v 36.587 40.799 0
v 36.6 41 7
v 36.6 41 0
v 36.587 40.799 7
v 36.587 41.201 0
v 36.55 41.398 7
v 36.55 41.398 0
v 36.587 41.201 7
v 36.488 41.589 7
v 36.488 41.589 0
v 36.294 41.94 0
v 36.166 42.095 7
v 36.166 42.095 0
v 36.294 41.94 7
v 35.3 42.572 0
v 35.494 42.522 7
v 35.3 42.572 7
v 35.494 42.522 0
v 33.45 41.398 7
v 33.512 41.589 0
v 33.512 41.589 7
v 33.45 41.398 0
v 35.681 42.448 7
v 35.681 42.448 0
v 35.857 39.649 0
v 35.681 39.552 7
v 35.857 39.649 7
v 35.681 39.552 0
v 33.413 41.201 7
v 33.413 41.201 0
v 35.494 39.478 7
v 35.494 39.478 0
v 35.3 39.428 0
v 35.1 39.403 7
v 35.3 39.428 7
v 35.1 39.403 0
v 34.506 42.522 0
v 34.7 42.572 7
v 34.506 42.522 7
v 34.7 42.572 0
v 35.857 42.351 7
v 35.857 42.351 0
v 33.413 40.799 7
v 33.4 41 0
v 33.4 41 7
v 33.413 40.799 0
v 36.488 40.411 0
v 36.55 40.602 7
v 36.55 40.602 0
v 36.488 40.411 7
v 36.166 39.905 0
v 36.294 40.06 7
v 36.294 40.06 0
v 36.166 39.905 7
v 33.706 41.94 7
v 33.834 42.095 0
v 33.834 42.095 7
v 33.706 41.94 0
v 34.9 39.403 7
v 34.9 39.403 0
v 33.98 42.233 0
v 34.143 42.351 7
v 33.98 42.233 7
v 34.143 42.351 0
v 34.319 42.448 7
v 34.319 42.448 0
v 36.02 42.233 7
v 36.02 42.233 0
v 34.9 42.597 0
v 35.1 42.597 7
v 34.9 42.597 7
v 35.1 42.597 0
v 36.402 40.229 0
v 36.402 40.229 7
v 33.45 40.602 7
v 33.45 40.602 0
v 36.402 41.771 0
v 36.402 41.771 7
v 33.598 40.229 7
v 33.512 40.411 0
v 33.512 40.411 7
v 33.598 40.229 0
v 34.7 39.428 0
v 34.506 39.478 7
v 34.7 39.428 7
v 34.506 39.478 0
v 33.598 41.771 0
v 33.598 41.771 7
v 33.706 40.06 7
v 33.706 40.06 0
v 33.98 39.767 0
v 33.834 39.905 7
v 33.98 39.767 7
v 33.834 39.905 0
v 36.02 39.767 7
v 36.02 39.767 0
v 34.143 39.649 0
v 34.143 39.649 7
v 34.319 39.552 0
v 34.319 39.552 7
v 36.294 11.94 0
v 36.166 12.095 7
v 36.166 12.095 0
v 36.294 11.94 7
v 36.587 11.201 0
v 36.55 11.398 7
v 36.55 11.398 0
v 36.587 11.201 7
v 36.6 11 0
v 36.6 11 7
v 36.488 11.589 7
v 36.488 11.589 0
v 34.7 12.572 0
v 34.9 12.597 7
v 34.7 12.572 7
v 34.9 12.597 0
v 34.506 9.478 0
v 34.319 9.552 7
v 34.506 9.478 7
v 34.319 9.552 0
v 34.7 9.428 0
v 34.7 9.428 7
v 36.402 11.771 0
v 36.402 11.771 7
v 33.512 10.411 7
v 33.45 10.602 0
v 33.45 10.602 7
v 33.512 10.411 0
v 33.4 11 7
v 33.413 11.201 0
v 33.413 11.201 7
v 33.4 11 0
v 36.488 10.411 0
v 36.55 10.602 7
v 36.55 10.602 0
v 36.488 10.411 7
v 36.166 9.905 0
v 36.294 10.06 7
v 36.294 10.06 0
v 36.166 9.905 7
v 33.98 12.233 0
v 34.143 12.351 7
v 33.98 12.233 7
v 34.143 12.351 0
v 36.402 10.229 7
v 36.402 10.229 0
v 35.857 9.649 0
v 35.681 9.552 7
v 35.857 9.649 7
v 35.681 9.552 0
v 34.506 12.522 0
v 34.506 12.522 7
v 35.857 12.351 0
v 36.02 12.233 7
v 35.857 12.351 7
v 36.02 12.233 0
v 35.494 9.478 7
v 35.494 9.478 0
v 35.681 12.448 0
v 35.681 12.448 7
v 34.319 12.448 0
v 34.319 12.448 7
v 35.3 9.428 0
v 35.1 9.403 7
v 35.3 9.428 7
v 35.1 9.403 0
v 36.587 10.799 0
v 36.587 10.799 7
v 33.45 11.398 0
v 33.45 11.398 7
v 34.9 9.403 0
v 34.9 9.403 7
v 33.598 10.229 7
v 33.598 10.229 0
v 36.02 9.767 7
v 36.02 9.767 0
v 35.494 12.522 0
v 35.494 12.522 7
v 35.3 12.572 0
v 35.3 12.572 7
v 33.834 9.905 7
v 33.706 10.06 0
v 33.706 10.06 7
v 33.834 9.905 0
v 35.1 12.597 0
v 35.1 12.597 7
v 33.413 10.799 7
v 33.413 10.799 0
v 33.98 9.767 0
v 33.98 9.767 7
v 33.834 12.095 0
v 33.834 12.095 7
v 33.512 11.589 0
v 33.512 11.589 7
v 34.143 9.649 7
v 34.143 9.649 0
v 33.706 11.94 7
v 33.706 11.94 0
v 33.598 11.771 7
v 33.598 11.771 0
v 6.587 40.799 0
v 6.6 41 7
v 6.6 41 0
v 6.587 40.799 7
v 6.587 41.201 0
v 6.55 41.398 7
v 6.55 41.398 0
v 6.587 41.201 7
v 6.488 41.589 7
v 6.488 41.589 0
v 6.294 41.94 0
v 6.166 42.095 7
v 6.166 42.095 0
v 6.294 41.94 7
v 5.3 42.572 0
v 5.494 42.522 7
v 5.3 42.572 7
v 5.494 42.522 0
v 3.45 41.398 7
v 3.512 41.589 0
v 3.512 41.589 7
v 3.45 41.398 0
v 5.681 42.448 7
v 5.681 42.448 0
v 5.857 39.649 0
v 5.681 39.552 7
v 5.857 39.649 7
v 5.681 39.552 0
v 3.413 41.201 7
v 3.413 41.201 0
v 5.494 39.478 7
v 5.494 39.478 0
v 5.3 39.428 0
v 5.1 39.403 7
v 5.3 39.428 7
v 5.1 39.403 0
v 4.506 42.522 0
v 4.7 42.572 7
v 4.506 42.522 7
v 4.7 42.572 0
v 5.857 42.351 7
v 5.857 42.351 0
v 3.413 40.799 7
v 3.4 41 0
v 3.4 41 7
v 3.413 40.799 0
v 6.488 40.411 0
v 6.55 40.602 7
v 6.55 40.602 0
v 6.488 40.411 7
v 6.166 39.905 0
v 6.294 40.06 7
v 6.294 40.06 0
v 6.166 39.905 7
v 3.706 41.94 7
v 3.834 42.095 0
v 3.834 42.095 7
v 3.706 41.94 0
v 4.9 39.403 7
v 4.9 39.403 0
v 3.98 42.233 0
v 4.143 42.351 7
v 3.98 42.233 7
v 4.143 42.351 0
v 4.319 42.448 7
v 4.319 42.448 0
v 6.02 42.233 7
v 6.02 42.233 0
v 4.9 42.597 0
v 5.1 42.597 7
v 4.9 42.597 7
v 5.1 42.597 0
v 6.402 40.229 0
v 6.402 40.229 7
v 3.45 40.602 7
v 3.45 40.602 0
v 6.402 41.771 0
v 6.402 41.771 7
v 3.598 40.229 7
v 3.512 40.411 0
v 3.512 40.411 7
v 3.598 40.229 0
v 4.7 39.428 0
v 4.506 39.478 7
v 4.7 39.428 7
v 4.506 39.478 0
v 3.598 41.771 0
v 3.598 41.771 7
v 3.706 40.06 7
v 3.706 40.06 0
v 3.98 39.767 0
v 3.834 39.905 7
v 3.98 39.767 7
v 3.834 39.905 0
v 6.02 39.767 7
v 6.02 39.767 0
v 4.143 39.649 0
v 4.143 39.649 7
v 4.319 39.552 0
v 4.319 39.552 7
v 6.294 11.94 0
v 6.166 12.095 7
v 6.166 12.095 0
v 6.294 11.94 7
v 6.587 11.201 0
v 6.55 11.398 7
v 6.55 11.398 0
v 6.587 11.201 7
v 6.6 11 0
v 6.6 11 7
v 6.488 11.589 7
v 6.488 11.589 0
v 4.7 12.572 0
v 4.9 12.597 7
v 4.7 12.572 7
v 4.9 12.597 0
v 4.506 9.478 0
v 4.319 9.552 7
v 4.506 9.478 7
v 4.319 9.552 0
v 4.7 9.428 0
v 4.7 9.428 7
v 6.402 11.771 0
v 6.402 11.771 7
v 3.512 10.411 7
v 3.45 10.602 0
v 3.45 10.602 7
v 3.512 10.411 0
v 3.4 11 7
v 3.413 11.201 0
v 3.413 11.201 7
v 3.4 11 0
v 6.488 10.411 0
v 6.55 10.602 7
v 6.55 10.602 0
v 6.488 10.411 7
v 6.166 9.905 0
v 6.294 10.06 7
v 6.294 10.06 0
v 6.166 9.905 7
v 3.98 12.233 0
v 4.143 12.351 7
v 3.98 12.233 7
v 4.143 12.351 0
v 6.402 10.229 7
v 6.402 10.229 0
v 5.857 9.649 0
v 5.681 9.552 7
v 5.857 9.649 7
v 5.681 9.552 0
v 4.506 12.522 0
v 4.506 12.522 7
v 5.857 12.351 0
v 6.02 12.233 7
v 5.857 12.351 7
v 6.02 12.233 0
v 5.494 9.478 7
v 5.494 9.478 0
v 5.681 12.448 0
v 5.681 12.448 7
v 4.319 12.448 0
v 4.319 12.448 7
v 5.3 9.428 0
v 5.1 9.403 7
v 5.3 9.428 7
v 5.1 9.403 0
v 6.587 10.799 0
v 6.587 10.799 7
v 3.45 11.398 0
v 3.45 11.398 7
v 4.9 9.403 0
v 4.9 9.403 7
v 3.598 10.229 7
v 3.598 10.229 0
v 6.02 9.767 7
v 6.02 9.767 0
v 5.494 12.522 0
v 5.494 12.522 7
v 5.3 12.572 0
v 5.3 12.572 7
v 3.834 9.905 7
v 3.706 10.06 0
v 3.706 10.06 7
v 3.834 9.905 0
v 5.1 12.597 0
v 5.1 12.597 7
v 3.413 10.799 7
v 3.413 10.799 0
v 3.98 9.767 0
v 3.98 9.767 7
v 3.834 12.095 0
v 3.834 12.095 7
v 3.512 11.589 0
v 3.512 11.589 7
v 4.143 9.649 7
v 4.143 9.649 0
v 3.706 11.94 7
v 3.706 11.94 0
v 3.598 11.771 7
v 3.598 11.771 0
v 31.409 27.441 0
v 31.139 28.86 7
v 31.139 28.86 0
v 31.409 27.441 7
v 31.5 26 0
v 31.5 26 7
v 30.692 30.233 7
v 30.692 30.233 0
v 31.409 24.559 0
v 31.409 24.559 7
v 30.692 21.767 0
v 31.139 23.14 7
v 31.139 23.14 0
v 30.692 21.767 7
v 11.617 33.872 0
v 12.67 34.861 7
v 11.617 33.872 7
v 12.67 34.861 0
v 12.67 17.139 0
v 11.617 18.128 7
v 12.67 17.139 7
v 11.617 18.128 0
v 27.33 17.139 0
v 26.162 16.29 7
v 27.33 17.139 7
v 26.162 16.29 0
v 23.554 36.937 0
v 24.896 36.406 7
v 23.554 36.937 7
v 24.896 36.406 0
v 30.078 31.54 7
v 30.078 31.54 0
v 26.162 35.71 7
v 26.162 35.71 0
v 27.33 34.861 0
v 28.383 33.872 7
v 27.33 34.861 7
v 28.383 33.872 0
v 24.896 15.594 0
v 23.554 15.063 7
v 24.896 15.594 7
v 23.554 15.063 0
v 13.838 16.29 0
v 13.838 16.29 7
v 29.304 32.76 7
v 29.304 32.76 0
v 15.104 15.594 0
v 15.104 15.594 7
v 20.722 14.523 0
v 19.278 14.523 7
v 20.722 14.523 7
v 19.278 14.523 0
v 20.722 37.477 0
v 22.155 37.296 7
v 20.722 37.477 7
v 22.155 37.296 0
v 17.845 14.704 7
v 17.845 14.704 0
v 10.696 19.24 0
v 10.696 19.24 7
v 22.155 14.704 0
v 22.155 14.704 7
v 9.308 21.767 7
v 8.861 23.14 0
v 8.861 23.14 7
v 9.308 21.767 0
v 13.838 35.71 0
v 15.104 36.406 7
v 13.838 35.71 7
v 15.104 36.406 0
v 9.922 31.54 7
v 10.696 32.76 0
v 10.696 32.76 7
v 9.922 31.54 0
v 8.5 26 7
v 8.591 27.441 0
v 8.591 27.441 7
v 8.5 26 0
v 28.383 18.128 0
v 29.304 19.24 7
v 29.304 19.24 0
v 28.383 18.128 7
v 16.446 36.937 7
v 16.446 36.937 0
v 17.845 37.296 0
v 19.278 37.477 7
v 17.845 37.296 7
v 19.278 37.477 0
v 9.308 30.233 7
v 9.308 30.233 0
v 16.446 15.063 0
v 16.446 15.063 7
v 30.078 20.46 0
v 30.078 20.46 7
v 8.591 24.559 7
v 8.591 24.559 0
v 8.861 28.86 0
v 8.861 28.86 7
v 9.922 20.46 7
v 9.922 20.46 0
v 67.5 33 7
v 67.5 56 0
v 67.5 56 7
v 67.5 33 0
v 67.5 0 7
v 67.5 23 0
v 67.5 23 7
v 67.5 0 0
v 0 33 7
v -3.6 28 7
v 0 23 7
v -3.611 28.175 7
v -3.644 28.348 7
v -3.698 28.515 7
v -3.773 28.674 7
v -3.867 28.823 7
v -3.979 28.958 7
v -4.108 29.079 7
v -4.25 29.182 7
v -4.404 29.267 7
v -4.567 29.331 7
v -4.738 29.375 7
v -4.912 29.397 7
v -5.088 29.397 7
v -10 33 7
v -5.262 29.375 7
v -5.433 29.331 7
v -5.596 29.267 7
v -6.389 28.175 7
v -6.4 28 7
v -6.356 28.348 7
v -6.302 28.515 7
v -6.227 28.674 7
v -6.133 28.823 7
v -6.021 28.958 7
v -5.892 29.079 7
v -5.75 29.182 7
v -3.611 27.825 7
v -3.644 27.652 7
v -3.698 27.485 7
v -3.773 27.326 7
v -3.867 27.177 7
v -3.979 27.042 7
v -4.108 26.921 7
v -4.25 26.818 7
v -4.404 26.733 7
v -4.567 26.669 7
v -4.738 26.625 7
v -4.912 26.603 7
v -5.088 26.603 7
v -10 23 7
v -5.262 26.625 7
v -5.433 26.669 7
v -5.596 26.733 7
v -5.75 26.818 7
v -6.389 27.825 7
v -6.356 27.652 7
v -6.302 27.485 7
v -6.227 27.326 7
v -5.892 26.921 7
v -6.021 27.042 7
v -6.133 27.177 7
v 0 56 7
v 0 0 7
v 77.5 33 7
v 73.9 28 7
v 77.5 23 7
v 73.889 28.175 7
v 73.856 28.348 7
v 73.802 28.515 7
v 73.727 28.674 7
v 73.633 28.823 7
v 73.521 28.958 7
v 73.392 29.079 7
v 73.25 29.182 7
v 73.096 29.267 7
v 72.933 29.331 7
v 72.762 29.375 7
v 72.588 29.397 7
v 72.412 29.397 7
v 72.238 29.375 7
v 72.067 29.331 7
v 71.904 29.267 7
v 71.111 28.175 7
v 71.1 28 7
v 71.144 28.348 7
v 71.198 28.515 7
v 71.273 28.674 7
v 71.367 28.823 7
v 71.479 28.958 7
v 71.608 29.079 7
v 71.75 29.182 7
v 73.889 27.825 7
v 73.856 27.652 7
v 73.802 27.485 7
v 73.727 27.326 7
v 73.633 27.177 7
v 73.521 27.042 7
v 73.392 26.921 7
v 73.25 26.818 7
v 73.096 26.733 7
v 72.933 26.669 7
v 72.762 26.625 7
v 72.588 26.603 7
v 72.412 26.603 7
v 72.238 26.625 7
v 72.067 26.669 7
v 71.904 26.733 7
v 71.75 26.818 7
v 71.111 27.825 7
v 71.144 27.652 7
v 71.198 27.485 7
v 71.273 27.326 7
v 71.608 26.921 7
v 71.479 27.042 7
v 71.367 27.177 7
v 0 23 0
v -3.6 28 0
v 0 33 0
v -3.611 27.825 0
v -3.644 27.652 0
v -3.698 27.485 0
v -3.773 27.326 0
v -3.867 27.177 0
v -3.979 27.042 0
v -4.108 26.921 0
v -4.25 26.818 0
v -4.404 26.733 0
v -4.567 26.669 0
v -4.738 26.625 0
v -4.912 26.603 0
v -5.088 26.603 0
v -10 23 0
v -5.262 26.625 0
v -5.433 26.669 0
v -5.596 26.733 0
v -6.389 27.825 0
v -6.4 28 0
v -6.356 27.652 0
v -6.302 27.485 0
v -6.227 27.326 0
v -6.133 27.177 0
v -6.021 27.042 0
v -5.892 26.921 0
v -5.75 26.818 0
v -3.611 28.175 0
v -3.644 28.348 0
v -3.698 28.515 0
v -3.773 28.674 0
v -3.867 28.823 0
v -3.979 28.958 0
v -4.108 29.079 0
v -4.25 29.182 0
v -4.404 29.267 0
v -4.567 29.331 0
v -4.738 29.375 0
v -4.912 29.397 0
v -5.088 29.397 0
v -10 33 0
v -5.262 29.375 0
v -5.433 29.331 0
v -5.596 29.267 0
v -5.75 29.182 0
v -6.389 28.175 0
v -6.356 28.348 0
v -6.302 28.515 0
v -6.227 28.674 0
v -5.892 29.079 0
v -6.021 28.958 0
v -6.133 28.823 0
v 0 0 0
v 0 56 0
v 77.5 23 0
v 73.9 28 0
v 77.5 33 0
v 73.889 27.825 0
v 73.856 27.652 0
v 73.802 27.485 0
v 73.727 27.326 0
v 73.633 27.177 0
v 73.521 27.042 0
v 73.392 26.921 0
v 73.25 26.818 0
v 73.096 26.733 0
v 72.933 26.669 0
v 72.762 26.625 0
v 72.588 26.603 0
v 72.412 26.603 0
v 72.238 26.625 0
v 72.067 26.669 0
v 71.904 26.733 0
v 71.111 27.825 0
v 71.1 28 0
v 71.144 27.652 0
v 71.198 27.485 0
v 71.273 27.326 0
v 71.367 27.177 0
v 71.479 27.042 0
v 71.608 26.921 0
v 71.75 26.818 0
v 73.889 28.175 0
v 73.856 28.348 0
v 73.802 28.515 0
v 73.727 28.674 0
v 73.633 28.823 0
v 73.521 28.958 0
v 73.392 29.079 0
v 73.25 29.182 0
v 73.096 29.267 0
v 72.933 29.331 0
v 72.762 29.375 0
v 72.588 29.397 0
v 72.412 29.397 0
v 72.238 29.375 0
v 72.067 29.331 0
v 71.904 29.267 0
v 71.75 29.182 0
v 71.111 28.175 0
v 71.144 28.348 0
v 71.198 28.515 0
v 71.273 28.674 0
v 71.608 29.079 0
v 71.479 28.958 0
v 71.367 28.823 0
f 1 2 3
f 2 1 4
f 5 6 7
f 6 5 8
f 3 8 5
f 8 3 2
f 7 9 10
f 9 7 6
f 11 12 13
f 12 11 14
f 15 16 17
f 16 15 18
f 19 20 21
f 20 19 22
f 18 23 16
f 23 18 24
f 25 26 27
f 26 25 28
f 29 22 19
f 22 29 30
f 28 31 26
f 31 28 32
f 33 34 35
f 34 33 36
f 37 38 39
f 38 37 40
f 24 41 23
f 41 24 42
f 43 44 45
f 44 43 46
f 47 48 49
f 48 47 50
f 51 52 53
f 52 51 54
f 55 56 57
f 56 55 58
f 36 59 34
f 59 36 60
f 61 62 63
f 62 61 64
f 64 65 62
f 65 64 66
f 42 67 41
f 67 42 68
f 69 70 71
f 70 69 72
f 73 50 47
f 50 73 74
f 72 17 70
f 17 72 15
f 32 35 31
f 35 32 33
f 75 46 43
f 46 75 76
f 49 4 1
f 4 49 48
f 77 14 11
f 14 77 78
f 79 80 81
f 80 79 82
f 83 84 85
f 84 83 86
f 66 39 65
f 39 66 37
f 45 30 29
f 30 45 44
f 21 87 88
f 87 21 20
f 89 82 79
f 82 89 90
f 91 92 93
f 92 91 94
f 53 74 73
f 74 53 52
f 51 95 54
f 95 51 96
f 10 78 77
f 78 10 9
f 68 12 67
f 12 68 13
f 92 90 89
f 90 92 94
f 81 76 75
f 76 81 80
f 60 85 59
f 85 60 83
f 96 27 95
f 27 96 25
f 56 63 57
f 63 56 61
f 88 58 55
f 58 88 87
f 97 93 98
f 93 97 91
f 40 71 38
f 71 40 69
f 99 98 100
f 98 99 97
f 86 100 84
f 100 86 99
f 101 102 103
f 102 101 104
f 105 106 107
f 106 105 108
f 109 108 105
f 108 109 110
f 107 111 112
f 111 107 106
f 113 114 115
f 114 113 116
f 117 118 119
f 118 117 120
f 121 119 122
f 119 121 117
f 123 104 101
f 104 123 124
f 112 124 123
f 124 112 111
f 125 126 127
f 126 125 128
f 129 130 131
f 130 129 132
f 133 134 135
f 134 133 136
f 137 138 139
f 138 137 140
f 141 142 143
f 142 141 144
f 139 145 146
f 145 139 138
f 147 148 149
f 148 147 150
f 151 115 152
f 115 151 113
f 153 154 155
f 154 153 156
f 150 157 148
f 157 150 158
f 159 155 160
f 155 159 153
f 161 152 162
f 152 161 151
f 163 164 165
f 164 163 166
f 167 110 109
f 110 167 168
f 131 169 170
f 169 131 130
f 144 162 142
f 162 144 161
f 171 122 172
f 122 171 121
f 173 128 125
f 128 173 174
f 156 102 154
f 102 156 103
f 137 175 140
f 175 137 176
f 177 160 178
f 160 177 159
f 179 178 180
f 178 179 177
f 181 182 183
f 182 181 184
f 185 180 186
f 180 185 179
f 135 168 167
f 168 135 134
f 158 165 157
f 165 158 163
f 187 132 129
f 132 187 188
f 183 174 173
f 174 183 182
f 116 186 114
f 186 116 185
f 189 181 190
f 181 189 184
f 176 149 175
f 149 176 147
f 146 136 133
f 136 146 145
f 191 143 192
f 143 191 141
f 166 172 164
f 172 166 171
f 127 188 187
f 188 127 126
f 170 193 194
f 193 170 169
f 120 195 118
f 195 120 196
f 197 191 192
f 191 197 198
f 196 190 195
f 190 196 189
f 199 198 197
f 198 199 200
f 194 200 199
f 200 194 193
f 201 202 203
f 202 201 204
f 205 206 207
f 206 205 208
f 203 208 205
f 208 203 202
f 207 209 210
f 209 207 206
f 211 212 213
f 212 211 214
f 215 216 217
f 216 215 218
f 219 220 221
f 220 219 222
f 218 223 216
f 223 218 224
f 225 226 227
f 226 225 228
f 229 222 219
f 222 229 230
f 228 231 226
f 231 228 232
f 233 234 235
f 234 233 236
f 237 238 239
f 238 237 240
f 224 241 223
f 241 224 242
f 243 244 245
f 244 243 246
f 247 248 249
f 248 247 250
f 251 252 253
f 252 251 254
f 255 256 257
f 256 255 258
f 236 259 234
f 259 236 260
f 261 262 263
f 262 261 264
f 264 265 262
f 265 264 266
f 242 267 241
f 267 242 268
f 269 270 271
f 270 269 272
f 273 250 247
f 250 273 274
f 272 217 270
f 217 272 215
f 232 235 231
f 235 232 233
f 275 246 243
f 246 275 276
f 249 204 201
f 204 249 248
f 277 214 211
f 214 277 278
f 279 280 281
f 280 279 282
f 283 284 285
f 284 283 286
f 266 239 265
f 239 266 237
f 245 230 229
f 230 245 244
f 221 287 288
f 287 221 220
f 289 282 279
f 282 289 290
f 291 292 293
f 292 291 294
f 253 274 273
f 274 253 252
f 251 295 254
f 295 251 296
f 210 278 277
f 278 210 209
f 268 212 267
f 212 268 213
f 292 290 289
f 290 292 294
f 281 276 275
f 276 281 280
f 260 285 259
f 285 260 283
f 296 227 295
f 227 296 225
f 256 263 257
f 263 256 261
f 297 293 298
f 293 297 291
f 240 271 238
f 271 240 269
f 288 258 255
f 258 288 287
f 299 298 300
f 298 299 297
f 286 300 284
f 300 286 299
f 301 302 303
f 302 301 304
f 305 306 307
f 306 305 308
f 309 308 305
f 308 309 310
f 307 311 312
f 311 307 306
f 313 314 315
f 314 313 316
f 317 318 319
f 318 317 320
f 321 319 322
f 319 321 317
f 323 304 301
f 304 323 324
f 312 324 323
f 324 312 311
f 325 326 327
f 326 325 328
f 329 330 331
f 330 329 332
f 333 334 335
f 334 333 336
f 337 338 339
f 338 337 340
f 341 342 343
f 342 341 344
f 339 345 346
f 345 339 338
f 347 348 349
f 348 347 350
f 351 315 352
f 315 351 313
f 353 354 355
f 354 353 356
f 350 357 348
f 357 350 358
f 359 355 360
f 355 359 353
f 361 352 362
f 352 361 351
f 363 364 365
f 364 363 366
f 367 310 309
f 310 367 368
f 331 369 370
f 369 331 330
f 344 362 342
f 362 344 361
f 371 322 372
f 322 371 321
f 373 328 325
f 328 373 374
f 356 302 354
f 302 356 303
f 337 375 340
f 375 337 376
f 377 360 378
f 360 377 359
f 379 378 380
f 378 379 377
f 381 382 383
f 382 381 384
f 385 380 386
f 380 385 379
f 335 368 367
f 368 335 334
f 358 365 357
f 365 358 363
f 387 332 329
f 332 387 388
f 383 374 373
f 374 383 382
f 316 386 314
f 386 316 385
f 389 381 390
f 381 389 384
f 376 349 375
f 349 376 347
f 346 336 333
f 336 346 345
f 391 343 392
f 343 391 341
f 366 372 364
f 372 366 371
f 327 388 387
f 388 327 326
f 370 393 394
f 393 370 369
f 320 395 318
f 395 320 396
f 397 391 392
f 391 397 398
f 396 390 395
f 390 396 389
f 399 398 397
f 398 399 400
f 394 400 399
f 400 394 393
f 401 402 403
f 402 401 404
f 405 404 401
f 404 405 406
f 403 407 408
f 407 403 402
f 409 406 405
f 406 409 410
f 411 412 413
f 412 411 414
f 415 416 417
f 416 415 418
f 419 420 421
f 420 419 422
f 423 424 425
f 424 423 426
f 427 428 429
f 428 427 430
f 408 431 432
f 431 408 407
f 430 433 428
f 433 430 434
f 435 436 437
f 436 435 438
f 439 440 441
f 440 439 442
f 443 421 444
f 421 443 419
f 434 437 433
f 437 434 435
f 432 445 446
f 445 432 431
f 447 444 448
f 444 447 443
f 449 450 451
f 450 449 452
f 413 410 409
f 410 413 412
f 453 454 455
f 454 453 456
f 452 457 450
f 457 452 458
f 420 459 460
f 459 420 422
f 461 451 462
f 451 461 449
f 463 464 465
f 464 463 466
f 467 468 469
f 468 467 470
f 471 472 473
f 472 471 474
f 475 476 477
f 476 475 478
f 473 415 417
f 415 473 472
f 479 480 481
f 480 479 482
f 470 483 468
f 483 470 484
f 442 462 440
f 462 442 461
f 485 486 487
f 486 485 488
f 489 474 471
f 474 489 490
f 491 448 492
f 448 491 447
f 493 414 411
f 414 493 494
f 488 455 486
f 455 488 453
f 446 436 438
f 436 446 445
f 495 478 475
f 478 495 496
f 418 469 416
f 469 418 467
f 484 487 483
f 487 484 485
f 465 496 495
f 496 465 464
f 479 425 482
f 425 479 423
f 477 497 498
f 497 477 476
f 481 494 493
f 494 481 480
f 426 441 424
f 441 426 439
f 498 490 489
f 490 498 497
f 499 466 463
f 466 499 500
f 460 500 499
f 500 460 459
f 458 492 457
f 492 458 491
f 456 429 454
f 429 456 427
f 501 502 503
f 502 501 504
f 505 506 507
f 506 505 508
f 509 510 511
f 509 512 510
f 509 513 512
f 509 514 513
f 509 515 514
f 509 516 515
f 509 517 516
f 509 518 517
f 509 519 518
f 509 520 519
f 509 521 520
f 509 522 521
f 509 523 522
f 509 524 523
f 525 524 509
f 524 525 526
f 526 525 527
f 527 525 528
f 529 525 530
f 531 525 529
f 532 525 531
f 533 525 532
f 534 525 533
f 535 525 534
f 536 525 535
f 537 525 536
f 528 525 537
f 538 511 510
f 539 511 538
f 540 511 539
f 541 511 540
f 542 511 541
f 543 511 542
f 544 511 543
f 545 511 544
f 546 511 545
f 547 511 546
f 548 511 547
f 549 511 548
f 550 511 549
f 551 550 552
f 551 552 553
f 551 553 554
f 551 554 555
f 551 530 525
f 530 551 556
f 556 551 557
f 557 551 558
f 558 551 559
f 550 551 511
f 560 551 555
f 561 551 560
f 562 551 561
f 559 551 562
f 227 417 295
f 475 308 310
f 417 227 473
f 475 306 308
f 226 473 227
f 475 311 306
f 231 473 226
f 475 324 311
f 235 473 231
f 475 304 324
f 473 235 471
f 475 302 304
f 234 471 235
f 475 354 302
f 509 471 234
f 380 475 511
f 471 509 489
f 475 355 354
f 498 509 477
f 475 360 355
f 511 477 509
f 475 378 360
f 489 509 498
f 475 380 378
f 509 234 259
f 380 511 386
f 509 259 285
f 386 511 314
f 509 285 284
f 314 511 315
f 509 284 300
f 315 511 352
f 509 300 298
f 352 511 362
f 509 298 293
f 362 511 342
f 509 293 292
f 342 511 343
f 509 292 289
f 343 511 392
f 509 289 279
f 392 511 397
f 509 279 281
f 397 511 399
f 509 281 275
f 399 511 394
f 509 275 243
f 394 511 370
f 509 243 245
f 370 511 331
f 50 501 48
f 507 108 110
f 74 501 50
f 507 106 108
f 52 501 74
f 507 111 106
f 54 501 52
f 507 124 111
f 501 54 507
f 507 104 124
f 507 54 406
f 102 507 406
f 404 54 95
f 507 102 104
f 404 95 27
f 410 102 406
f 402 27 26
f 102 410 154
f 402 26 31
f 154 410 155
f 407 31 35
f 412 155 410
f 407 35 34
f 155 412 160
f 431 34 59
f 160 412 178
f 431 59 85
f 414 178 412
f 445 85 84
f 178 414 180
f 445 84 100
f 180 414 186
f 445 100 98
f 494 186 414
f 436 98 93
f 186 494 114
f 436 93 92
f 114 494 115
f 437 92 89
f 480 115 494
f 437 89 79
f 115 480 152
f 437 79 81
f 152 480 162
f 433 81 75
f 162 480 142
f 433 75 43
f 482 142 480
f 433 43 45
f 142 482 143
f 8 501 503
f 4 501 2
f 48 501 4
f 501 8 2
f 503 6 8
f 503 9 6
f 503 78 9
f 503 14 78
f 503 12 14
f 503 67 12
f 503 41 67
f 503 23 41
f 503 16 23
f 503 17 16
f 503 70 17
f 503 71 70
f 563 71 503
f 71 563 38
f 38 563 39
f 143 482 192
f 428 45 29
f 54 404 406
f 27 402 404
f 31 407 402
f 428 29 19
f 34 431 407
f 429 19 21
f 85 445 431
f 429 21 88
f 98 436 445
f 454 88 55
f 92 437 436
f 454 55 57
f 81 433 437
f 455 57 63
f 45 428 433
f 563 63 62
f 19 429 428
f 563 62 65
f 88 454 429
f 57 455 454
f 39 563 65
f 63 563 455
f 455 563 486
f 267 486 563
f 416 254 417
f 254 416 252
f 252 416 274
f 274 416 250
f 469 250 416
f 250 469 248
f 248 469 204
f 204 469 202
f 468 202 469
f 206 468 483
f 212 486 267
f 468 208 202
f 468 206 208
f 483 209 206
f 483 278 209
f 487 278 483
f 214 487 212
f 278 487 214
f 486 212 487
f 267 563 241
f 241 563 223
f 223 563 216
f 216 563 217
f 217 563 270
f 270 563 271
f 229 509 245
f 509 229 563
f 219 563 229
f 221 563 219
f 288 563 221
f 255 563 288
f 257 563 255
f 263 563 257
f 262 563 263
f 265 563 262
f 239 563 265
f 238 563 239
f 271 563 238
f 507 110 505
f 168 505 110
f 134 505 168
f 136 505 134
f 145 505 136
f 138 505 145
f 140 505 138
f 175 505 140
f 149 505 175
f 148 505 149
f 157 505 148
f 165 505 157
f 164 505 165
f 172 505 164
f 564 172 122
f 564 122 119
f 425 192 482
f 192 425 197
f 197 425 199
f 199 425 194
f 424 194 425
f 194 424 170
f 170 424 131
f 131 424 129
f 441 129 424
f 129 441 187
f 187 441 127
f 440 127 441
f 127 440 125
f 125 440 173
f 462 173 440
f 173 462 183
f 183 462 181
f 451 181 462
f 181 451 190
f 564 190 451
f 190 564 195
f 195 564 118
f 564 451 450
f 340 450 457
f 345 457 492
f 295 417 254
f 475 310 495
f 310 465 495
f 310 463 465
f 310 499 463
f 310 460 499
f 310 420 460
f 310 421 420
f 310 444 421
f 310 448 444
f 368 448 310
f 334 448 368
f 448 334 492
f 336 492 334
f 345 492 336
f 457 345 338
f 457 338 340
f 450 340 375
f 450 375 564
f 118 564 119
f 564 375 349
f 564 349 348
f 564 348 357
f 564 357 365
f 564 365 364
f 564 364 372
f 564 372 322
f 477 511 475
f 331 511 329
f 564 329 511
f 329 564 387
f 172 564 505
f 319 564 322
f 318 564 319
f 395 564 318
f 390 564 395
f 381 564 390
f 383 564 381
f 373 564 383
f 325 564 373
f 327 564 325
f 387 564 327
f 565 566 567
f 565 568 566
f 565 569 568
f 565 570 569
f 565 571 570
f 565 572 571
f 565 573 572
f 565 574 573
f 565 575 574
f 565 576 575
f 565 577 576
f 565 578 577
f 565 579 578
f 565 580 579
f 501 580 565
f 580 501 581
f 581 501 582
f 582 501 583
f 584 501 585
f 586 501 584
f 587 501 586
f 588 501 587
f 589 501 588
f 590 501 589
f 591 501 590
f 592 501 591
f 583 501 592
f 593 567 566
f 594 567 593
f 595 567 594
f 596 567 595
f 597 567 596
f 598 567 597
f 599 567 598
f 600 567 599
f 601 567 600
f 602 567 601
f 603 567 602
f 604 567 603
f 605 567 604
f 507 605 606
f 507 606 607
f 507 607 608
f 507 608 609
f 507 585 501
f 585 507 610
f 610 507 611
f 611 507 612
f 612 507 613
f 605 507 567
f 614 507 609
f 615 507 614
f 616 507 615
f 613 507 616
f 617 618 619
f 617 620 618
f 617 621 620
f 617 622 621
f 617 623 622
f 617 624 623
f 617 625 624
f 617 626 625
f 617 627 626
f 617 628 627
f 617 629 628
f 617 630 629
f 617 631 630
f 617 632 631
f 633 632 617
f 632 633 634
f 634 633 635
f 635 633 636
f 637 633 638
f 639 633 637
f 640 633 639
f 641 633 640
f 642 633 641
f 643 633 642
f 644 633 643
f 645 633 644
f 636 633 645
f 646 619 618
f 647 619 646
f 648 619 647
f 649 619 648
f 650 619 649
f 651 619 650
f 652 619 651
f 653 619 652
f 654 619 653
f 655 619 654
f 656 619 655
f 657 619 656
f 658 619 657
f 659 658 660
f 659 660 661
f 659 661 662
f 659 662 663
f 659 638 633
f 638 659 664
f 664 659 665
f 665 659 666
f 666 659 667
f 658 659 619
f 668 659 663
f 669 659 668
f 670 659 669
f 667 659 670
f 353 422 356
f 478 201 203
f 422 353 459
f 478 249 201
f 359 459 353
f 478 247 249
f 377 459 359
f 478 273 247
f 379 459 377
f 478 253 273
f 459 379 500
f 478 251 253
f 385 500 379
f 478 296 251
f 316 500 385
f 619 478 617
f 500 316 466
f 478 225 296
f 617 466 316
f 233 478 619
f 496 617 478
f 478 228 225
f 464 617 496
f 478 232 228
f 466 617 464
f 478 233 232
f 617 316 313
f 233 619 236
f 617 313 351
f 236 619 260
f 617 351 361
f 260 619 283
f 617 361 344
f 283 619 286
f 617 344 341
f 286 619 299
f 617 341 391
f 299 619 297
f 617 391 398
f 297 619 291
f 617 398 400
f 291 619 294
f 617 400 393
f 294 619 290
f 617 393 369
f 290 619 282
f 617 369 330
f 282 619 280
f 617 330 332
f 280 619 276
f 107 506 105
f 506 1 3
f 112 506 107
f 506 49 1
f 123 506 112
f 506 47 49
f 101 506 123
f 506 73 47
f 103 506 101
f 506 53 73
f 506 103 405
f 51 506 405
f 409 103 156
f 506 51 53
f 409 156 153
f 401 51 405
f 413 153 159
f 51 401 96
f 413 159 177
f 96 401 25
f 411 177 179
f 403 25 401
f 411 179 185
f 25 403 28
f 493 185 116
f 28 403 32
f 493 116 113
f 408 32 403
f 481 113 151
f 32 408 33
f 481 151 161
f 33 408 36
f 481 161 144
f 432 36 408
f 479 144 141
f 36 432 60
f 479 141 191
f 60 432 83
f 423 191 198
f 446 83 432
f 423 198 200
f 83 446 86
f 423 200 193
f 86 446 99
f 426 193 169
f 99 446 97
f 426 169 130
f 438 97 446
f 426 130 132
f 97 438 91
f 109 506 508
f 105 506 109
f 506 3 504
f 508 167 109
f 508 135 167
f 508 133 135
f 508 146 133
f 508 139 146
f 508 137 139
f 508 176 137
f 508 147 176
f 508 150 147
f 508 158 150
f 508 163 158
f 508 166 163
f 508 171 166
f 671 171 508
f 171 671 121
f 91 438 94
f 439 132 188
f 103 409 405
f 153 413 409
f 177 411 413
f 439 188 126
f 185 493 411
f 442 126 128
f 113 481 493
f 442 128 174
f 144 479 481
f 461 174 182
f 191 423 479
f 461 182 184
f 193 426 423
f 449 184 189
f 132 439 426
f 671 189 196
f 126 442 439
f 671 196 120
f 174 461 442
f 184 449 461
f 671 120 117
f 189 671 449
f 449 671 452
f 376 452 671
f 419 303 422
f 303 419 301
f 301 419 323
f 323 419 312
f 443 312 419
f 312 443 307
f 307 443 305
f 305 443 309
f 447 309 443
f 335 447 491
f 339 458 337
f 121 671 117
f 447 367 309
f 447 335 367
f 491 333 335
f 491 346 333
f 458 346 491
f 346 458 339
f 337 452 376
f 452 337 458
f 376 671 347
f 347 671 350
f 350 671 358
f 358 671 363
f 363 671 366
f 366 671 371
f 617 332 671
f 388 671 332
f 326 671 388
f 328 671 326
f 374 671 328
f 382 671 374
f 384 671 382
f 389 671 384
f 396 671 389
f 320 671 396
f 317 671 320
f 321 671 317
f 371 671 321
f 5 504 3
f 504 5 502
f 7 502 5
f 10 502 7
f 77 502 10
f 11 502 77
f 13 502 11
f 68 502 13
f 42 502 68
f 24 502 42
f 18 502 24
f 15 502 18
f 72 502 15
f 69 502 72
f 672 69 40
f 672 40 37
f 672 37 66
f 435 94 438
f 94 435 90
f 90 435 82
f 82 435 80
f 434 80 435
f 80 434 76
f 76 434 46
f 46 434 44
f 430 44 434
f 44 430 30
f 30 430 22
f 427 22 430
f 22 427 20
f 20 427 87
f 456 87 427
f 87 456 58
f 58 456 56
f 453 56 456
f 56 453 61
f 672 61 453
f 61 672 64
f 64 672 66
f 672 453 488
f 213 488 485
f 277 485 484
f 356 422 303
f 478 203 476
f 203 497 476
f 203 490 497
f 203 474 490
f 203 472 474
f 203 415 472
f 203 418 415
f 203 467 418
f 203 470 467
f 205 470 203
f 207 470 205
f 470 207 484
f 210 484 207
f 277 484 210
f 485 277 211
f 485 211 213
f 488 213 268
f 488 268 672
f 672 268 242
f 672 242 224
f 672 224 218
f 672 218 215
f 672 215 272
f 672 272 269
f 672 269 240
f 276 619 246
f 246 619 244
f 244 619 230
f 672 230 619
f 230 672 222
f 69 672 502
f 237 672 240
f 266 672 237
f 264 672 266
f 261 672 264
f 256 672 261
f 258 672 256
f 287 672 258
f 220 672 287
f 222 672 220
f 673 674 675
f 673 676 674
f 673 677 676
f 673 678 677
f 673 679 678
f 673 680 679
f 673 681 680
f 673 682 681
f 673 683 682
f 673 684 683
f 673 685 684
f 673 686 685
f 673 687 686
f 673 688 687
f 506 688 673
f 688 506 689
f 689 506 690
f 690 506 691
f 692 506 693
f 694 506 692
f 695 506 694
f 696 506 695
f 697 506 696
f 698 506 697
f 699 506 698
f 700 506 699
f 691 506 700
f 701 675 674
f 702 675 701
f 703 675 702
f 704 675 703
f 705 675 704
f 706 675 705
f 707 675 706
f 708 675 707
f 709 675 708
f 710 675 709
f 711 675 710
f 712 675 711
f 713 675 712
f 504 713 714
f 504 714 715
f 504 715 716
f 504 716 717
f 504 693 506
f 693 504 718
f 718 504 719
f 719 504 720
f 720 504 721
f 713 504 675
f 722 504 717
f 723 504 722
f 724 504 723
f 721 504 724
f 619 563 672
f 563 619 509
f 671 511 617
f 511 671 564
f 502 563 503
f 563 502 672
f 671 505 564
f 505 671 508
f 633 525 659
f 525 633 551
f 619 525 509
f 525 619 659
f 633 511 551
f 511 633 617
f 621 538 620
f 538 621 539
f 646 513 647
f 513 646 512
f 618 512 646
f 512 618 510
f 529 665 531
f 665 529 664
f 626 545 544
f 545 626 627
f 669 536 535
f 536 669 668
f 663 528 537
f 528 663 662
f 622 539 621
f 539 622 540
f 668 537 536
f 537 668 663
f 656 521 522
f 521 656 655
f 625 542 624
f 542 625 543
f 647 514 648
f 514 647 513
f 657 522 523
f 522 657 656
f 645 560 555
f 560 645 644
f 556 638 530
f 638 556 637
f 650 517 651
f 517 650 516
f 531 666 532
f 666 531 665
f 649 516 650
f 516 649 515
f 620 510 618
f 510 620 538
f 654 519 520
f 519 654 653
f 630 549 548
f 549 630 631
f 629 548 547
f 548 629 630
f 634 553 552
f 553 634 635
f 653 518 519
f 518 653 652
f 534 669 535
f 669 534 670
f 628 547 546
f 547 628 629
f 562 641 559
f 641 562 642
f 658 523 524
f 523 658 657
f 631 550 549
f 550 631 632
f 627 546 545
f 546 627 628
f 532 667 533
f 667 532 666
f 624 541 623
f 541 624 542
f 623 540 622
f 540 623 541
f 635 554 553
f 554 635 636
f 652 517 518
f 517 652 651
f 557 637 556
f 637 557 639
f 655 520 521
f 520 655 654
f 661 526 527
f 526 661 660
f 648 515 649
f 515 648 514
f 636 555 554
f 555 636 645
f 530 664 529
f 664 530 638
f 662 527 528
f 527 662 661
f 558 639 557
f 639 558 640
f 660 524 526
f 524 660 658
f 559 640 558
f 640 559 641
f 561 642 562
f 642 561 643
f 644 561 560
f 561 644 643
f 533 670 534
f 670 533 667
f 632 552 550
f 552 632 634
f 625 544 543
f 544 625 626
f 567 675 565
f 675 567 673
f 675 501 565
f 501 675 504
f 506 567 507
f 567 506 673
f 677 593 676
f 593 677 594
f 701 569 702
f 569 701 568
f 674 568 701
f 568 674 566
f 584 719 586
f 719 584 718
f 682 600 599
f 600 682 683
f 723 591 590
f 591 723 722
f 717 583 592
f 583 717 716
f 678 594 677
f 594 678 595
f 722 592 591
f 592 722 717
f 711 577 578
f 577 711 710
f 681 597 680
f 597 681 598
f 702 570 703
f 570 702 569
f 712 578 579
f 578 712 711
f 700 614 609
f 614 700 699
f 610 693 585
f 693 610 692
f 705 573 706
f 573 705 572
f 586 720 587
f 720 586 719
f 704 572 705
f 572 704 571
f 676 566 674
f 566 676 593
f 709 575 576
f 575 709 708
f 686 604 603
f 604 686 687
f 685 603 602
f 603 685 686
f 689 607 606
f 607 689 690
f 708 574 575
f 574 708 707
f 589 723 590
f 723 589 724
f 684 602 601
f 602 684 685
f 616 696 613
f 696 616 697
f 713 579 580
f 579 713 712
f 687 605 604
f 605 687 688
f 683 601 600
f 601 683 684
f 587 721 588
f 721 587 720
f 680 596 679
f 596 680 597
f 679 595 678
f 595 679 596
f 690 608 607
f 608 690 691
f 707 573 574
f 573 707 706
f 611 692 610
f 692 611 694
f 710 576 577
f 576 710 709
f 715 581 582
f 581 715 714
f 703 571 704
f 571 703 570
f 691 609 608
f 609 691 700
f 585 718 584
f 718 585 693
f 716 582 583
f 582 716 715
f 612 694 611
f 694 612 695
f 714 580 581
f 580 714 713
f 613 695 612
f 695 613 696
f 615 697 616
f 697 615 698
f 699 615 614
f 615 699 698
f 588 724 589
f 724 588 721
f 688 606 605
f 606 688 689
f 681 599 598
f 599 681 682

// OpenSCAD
$fn = 50;

height = 7;

difference() {
cube([67.5, 56, height]);
translate ([20,26,0]){
    translate ([15,15,0]) cylinder(  height*2+1, 1.6, 1.6, true );
    translate ([15,-15,0]) cylinder(  height*2+1, 1.6, 1.6, true );
    translate ([-15,15,0]) cylinder(  height*2+1, 1.6, 1.6, true );
    translate ([-15,-15,0]) cylinder(  height*2+1, 1.6, 1.6, true );
    cylinder(  height*2+1, 11.5, 11.5, true );
}
}
translate ([-10,56/2-10/2,0]) difference(){
    cube([10, 10, height]);
    translate ([5,5,0]) cylinder(  height*2+1, 1.4, 1.4, true );
};
translate ([67.5,56/2-10/2,0]) difference(){
    cube([10, 10, height]);
    translate ([5,5,0]) cylinder(  height*2+1, 1.4, 1.4, true );
}
